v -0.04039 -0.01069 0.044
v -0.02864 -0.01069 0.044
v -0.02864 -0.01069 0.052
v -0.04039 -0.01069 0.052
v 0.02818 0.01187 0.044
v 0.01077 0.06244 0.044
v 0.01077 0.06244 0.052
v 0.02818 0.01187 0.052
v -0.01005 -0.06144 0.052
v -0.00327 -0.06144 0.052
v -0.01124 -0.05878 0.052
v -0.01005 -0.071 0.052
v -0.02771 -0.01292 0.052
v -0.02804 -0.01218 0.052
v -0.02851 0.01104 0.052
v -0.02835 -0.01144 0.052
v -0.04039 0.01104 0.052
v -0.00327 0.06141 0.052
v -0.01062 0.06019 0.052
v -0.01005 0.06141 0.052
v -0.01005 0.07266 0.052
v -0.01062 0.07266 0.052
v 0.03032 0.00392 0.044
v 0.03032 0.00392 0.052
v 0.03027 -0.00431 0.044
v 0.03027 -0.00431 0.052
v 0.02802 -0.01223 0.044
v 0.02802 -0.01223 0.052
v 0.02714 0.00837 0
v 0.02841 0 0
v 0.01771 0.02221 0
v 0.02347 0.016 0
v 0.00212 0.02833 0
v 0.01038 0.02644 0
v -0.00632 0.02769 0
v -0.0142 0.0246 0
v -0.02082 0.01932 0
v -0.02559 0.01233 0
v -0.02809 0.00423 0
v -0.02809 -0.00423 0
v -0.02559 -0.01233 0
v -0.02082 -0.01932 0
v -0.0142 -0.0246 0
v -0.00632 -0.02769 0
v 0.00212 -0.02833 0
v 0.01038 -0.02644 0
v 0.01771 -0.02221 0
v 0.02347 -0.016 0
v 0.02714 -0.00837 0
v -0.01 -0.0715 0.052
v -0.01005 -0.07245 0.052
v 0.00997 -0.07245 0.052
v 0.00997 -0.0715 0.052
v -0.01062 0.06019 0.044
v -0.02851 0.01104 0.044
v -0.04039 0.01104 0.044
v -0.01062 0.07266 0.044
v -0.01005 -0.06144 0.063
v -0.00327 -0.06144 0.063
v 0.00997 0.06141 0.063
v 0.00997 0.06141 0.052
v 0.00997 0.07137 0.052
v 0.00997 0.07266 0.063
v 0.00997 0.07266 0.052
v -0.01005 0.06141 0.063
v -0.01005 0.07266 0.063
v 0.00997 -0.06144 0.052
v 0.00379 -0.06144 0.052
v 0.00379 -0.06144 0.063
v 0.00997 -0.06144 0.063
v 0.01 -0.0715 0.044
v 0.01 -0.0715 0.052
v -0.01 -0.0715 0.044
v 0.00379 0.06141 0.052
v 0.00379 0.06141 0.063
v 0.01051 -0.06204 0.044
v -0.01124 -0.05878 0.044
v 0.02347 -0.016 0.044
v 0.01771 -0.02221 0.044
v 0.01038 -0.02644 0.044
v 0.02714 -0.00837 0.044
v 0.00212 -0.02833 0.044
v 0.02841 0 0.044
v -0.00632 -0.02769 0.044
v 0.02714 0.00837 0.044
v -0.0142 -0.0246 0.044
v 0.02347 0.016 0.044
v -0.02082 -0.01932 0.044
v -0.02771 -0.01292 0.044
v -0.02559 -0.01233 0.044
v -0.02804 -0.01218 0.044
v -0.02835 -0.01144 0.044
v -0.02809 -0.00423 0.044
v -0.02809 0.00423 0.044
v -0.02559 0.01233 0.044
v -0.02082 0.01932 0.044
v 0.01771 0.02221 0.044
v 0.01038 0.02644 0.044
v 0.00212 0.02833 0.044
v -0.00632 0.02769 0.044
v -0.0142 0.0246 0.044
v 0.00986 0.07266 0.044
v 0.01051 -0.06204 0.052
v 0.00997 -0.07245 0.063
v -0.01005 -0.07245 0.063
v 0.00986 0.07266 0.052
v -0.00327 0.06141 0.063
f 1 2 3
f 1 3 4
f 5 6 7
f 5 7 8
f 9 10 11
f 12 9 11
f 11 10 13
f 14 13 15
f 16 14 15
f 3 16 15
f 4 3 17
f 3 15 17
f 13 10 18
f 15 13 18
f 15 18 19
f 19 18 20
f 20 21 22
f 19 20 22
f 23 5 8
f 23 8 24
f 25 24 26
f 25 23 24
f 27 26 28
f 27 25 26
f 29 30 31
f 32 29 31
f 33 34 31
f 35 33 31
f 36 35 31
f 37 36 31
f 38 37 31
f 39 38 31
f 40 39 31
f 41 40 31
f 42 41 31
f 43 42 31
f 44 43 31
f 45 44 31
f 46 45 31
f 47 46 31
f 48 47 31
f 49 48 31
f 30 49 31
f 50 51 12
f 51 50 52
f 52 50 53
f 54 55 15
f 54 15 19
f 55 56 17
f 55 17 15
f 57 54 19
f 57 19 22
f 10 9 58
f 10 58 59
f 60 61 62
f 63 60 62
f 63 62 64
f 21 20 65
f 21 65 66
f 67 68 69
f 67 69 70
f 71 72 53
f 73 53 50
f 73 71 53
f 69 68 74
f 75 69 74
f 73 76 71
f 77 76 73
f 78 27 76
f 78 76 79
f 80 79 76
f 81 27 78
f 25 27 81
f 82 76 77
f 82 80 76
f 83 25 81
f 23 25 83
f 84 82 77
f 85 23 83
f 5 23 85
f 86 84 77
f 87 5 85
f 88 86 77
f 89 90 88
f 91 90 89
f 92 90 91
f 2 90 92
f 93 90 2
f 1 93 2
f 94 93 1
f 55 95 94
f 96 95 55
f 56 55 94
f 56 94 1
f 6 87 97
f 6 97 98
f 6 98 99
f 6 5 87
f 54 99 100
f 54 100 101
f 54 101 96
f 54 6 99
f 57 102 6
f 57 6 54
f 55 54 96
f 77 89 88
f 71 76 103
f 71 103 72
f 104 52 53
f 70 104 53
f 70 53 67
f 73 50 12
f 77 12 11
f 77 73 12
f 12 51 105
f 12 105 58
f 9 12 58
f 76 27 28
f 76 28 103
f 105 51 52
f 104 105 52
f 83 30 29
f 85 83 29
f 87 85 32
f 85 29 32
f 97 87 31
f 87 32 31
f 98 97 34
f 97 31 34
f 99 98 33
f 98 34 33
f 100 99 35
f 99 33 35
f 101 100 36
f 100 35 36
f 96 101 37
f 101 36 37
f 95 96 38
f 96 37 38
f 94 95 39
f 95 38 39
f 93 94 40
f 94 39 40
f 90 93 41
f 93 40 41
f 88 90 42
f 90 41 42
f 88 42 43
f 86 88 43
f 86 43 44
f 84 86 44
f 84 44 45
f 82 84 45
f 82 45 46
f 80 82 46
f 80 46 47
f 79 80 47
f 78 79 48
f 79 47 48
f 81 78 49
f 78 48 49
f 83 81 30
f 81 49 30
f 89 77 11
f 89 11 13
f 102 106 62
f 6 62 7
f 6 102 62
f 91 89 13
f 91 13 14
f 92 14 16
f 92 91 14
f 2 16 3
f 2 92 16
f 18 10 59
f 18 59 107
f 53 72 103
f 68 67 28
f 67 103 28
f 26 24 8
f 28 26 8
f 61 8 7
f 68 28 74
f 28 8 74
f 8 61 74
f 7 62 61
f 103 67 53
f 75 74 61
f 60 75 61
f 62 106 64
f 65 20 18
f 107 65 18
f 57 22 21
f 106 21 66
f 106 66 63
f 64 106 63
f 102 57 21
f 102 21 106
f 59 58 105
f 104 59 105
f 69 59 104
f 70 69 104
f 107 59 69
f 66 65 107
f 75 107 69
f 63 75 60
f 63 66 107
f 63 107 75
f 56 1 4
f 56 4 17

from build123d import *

# Parameters (mm, degrees)
SKETCH1_R           = 0.028406682
BOSS_EXTRUDE1_DEPTH = 0.044
BOSS_EXTRUDE2_DEPTH = 0.008
SKETCH3_W           = 0.02001877
SKETCH3_H           = 0.011245582
SKETCH3_H_2         = 0.011009053
BOSS_EXTRUDE3_DEPTH = 0.011
SKETCH4_W           = 0.007059528
SKETCH4_H           = 0.122854085
BOSS_EXTRUDE4_DEPTH = 0.011


with BuildPart() as part:
    # Sketch1 → Boss-Extrude1 (new body)
    with BuildSketch(Plane.XY):
        Circle(SKETCH1_R)
    extrude(amount=BOSS_EXTRUDE1_DEPTH)

    # Sketch2 → Boss-Extrude2 (add)
    with BuildSketch(Plane.XY.offset(0.044)):
        with BuildLine():
            Line((-0.028511858, 0.011040645), (-0.010617218, 0.060186572))
            Line((-0.010617218, 0.060186572), (-0.010617218, 0.072656083))
            Line((-0.010617218, 0.072656083), (0.009855522, 0.072656083))
            Line((0.009855522, 0.072656083), (0.01076512, 0.062438855))
            Line((0.01076512, 0.062438855), (0.028177961, 0.011866947))
            ThreePointArc((0.028177961, 0.011866947), (0.030574228, -0.000196141), (0.028023389, -0.012227493))
            Line((0.028023389, -0.012227493), (0.010514305, -0.06203853))
            Line((0.010514305, -0.06203853), (0.01, -0.071500003))
            Line((0.01, -0.071500003), (-0.01, -0.071500003))
            Line((-0.01, -0.071500003), (-0.011238314, -0.058784869))
            Line((-0.011238314, -0.058784869), (-0.027712476, -0.01291668))
            ThreePointArc((-0.027712476, -0.01291668), (-0.028200603, -0.01181304), (-0.028644799, -0.010690998))
            Line((-0.028644799, -0.010690998), (-0.040386658, -0.010690998))
            Line((-0.040386658, -0.010690998), (-0.040386658, 0.011040645))
            Line((-0.040386658, 0.011040645), (-0.028511858, 0.011040645))
        make_face()
    extrude(amount=BOSS_EXTRUDE2_DEPTH)

    # Sketch3 → Boss-Extrude3 (add)
    with BuildSketch(Plane.XY.offset(0.052)):
        with Locations((-3.9476e-05, 0.067033292)):
            Rectangle(SKETCH3_W, SKETCH3_H)
        with Locations((-3.9476e-05, -0.066948111)):
            Rectangle(SKETCH3_W, SKETCH3_H_2)
    extrude(amount=BOSS_EXTRUDE3_DEPTH)

    # Sketch4 → Boss-Extrude4 (add)
    with BuildSketch(Plane.XY.offset(0.052)):
        with Locations((0.000258562, -1.6541e-05)):
            Rectangle(SKETCH4_W, SKETCH4_H)
    extrude(amount=BOSS_EXTRUDE4_DEPTH)


solid = part.part
